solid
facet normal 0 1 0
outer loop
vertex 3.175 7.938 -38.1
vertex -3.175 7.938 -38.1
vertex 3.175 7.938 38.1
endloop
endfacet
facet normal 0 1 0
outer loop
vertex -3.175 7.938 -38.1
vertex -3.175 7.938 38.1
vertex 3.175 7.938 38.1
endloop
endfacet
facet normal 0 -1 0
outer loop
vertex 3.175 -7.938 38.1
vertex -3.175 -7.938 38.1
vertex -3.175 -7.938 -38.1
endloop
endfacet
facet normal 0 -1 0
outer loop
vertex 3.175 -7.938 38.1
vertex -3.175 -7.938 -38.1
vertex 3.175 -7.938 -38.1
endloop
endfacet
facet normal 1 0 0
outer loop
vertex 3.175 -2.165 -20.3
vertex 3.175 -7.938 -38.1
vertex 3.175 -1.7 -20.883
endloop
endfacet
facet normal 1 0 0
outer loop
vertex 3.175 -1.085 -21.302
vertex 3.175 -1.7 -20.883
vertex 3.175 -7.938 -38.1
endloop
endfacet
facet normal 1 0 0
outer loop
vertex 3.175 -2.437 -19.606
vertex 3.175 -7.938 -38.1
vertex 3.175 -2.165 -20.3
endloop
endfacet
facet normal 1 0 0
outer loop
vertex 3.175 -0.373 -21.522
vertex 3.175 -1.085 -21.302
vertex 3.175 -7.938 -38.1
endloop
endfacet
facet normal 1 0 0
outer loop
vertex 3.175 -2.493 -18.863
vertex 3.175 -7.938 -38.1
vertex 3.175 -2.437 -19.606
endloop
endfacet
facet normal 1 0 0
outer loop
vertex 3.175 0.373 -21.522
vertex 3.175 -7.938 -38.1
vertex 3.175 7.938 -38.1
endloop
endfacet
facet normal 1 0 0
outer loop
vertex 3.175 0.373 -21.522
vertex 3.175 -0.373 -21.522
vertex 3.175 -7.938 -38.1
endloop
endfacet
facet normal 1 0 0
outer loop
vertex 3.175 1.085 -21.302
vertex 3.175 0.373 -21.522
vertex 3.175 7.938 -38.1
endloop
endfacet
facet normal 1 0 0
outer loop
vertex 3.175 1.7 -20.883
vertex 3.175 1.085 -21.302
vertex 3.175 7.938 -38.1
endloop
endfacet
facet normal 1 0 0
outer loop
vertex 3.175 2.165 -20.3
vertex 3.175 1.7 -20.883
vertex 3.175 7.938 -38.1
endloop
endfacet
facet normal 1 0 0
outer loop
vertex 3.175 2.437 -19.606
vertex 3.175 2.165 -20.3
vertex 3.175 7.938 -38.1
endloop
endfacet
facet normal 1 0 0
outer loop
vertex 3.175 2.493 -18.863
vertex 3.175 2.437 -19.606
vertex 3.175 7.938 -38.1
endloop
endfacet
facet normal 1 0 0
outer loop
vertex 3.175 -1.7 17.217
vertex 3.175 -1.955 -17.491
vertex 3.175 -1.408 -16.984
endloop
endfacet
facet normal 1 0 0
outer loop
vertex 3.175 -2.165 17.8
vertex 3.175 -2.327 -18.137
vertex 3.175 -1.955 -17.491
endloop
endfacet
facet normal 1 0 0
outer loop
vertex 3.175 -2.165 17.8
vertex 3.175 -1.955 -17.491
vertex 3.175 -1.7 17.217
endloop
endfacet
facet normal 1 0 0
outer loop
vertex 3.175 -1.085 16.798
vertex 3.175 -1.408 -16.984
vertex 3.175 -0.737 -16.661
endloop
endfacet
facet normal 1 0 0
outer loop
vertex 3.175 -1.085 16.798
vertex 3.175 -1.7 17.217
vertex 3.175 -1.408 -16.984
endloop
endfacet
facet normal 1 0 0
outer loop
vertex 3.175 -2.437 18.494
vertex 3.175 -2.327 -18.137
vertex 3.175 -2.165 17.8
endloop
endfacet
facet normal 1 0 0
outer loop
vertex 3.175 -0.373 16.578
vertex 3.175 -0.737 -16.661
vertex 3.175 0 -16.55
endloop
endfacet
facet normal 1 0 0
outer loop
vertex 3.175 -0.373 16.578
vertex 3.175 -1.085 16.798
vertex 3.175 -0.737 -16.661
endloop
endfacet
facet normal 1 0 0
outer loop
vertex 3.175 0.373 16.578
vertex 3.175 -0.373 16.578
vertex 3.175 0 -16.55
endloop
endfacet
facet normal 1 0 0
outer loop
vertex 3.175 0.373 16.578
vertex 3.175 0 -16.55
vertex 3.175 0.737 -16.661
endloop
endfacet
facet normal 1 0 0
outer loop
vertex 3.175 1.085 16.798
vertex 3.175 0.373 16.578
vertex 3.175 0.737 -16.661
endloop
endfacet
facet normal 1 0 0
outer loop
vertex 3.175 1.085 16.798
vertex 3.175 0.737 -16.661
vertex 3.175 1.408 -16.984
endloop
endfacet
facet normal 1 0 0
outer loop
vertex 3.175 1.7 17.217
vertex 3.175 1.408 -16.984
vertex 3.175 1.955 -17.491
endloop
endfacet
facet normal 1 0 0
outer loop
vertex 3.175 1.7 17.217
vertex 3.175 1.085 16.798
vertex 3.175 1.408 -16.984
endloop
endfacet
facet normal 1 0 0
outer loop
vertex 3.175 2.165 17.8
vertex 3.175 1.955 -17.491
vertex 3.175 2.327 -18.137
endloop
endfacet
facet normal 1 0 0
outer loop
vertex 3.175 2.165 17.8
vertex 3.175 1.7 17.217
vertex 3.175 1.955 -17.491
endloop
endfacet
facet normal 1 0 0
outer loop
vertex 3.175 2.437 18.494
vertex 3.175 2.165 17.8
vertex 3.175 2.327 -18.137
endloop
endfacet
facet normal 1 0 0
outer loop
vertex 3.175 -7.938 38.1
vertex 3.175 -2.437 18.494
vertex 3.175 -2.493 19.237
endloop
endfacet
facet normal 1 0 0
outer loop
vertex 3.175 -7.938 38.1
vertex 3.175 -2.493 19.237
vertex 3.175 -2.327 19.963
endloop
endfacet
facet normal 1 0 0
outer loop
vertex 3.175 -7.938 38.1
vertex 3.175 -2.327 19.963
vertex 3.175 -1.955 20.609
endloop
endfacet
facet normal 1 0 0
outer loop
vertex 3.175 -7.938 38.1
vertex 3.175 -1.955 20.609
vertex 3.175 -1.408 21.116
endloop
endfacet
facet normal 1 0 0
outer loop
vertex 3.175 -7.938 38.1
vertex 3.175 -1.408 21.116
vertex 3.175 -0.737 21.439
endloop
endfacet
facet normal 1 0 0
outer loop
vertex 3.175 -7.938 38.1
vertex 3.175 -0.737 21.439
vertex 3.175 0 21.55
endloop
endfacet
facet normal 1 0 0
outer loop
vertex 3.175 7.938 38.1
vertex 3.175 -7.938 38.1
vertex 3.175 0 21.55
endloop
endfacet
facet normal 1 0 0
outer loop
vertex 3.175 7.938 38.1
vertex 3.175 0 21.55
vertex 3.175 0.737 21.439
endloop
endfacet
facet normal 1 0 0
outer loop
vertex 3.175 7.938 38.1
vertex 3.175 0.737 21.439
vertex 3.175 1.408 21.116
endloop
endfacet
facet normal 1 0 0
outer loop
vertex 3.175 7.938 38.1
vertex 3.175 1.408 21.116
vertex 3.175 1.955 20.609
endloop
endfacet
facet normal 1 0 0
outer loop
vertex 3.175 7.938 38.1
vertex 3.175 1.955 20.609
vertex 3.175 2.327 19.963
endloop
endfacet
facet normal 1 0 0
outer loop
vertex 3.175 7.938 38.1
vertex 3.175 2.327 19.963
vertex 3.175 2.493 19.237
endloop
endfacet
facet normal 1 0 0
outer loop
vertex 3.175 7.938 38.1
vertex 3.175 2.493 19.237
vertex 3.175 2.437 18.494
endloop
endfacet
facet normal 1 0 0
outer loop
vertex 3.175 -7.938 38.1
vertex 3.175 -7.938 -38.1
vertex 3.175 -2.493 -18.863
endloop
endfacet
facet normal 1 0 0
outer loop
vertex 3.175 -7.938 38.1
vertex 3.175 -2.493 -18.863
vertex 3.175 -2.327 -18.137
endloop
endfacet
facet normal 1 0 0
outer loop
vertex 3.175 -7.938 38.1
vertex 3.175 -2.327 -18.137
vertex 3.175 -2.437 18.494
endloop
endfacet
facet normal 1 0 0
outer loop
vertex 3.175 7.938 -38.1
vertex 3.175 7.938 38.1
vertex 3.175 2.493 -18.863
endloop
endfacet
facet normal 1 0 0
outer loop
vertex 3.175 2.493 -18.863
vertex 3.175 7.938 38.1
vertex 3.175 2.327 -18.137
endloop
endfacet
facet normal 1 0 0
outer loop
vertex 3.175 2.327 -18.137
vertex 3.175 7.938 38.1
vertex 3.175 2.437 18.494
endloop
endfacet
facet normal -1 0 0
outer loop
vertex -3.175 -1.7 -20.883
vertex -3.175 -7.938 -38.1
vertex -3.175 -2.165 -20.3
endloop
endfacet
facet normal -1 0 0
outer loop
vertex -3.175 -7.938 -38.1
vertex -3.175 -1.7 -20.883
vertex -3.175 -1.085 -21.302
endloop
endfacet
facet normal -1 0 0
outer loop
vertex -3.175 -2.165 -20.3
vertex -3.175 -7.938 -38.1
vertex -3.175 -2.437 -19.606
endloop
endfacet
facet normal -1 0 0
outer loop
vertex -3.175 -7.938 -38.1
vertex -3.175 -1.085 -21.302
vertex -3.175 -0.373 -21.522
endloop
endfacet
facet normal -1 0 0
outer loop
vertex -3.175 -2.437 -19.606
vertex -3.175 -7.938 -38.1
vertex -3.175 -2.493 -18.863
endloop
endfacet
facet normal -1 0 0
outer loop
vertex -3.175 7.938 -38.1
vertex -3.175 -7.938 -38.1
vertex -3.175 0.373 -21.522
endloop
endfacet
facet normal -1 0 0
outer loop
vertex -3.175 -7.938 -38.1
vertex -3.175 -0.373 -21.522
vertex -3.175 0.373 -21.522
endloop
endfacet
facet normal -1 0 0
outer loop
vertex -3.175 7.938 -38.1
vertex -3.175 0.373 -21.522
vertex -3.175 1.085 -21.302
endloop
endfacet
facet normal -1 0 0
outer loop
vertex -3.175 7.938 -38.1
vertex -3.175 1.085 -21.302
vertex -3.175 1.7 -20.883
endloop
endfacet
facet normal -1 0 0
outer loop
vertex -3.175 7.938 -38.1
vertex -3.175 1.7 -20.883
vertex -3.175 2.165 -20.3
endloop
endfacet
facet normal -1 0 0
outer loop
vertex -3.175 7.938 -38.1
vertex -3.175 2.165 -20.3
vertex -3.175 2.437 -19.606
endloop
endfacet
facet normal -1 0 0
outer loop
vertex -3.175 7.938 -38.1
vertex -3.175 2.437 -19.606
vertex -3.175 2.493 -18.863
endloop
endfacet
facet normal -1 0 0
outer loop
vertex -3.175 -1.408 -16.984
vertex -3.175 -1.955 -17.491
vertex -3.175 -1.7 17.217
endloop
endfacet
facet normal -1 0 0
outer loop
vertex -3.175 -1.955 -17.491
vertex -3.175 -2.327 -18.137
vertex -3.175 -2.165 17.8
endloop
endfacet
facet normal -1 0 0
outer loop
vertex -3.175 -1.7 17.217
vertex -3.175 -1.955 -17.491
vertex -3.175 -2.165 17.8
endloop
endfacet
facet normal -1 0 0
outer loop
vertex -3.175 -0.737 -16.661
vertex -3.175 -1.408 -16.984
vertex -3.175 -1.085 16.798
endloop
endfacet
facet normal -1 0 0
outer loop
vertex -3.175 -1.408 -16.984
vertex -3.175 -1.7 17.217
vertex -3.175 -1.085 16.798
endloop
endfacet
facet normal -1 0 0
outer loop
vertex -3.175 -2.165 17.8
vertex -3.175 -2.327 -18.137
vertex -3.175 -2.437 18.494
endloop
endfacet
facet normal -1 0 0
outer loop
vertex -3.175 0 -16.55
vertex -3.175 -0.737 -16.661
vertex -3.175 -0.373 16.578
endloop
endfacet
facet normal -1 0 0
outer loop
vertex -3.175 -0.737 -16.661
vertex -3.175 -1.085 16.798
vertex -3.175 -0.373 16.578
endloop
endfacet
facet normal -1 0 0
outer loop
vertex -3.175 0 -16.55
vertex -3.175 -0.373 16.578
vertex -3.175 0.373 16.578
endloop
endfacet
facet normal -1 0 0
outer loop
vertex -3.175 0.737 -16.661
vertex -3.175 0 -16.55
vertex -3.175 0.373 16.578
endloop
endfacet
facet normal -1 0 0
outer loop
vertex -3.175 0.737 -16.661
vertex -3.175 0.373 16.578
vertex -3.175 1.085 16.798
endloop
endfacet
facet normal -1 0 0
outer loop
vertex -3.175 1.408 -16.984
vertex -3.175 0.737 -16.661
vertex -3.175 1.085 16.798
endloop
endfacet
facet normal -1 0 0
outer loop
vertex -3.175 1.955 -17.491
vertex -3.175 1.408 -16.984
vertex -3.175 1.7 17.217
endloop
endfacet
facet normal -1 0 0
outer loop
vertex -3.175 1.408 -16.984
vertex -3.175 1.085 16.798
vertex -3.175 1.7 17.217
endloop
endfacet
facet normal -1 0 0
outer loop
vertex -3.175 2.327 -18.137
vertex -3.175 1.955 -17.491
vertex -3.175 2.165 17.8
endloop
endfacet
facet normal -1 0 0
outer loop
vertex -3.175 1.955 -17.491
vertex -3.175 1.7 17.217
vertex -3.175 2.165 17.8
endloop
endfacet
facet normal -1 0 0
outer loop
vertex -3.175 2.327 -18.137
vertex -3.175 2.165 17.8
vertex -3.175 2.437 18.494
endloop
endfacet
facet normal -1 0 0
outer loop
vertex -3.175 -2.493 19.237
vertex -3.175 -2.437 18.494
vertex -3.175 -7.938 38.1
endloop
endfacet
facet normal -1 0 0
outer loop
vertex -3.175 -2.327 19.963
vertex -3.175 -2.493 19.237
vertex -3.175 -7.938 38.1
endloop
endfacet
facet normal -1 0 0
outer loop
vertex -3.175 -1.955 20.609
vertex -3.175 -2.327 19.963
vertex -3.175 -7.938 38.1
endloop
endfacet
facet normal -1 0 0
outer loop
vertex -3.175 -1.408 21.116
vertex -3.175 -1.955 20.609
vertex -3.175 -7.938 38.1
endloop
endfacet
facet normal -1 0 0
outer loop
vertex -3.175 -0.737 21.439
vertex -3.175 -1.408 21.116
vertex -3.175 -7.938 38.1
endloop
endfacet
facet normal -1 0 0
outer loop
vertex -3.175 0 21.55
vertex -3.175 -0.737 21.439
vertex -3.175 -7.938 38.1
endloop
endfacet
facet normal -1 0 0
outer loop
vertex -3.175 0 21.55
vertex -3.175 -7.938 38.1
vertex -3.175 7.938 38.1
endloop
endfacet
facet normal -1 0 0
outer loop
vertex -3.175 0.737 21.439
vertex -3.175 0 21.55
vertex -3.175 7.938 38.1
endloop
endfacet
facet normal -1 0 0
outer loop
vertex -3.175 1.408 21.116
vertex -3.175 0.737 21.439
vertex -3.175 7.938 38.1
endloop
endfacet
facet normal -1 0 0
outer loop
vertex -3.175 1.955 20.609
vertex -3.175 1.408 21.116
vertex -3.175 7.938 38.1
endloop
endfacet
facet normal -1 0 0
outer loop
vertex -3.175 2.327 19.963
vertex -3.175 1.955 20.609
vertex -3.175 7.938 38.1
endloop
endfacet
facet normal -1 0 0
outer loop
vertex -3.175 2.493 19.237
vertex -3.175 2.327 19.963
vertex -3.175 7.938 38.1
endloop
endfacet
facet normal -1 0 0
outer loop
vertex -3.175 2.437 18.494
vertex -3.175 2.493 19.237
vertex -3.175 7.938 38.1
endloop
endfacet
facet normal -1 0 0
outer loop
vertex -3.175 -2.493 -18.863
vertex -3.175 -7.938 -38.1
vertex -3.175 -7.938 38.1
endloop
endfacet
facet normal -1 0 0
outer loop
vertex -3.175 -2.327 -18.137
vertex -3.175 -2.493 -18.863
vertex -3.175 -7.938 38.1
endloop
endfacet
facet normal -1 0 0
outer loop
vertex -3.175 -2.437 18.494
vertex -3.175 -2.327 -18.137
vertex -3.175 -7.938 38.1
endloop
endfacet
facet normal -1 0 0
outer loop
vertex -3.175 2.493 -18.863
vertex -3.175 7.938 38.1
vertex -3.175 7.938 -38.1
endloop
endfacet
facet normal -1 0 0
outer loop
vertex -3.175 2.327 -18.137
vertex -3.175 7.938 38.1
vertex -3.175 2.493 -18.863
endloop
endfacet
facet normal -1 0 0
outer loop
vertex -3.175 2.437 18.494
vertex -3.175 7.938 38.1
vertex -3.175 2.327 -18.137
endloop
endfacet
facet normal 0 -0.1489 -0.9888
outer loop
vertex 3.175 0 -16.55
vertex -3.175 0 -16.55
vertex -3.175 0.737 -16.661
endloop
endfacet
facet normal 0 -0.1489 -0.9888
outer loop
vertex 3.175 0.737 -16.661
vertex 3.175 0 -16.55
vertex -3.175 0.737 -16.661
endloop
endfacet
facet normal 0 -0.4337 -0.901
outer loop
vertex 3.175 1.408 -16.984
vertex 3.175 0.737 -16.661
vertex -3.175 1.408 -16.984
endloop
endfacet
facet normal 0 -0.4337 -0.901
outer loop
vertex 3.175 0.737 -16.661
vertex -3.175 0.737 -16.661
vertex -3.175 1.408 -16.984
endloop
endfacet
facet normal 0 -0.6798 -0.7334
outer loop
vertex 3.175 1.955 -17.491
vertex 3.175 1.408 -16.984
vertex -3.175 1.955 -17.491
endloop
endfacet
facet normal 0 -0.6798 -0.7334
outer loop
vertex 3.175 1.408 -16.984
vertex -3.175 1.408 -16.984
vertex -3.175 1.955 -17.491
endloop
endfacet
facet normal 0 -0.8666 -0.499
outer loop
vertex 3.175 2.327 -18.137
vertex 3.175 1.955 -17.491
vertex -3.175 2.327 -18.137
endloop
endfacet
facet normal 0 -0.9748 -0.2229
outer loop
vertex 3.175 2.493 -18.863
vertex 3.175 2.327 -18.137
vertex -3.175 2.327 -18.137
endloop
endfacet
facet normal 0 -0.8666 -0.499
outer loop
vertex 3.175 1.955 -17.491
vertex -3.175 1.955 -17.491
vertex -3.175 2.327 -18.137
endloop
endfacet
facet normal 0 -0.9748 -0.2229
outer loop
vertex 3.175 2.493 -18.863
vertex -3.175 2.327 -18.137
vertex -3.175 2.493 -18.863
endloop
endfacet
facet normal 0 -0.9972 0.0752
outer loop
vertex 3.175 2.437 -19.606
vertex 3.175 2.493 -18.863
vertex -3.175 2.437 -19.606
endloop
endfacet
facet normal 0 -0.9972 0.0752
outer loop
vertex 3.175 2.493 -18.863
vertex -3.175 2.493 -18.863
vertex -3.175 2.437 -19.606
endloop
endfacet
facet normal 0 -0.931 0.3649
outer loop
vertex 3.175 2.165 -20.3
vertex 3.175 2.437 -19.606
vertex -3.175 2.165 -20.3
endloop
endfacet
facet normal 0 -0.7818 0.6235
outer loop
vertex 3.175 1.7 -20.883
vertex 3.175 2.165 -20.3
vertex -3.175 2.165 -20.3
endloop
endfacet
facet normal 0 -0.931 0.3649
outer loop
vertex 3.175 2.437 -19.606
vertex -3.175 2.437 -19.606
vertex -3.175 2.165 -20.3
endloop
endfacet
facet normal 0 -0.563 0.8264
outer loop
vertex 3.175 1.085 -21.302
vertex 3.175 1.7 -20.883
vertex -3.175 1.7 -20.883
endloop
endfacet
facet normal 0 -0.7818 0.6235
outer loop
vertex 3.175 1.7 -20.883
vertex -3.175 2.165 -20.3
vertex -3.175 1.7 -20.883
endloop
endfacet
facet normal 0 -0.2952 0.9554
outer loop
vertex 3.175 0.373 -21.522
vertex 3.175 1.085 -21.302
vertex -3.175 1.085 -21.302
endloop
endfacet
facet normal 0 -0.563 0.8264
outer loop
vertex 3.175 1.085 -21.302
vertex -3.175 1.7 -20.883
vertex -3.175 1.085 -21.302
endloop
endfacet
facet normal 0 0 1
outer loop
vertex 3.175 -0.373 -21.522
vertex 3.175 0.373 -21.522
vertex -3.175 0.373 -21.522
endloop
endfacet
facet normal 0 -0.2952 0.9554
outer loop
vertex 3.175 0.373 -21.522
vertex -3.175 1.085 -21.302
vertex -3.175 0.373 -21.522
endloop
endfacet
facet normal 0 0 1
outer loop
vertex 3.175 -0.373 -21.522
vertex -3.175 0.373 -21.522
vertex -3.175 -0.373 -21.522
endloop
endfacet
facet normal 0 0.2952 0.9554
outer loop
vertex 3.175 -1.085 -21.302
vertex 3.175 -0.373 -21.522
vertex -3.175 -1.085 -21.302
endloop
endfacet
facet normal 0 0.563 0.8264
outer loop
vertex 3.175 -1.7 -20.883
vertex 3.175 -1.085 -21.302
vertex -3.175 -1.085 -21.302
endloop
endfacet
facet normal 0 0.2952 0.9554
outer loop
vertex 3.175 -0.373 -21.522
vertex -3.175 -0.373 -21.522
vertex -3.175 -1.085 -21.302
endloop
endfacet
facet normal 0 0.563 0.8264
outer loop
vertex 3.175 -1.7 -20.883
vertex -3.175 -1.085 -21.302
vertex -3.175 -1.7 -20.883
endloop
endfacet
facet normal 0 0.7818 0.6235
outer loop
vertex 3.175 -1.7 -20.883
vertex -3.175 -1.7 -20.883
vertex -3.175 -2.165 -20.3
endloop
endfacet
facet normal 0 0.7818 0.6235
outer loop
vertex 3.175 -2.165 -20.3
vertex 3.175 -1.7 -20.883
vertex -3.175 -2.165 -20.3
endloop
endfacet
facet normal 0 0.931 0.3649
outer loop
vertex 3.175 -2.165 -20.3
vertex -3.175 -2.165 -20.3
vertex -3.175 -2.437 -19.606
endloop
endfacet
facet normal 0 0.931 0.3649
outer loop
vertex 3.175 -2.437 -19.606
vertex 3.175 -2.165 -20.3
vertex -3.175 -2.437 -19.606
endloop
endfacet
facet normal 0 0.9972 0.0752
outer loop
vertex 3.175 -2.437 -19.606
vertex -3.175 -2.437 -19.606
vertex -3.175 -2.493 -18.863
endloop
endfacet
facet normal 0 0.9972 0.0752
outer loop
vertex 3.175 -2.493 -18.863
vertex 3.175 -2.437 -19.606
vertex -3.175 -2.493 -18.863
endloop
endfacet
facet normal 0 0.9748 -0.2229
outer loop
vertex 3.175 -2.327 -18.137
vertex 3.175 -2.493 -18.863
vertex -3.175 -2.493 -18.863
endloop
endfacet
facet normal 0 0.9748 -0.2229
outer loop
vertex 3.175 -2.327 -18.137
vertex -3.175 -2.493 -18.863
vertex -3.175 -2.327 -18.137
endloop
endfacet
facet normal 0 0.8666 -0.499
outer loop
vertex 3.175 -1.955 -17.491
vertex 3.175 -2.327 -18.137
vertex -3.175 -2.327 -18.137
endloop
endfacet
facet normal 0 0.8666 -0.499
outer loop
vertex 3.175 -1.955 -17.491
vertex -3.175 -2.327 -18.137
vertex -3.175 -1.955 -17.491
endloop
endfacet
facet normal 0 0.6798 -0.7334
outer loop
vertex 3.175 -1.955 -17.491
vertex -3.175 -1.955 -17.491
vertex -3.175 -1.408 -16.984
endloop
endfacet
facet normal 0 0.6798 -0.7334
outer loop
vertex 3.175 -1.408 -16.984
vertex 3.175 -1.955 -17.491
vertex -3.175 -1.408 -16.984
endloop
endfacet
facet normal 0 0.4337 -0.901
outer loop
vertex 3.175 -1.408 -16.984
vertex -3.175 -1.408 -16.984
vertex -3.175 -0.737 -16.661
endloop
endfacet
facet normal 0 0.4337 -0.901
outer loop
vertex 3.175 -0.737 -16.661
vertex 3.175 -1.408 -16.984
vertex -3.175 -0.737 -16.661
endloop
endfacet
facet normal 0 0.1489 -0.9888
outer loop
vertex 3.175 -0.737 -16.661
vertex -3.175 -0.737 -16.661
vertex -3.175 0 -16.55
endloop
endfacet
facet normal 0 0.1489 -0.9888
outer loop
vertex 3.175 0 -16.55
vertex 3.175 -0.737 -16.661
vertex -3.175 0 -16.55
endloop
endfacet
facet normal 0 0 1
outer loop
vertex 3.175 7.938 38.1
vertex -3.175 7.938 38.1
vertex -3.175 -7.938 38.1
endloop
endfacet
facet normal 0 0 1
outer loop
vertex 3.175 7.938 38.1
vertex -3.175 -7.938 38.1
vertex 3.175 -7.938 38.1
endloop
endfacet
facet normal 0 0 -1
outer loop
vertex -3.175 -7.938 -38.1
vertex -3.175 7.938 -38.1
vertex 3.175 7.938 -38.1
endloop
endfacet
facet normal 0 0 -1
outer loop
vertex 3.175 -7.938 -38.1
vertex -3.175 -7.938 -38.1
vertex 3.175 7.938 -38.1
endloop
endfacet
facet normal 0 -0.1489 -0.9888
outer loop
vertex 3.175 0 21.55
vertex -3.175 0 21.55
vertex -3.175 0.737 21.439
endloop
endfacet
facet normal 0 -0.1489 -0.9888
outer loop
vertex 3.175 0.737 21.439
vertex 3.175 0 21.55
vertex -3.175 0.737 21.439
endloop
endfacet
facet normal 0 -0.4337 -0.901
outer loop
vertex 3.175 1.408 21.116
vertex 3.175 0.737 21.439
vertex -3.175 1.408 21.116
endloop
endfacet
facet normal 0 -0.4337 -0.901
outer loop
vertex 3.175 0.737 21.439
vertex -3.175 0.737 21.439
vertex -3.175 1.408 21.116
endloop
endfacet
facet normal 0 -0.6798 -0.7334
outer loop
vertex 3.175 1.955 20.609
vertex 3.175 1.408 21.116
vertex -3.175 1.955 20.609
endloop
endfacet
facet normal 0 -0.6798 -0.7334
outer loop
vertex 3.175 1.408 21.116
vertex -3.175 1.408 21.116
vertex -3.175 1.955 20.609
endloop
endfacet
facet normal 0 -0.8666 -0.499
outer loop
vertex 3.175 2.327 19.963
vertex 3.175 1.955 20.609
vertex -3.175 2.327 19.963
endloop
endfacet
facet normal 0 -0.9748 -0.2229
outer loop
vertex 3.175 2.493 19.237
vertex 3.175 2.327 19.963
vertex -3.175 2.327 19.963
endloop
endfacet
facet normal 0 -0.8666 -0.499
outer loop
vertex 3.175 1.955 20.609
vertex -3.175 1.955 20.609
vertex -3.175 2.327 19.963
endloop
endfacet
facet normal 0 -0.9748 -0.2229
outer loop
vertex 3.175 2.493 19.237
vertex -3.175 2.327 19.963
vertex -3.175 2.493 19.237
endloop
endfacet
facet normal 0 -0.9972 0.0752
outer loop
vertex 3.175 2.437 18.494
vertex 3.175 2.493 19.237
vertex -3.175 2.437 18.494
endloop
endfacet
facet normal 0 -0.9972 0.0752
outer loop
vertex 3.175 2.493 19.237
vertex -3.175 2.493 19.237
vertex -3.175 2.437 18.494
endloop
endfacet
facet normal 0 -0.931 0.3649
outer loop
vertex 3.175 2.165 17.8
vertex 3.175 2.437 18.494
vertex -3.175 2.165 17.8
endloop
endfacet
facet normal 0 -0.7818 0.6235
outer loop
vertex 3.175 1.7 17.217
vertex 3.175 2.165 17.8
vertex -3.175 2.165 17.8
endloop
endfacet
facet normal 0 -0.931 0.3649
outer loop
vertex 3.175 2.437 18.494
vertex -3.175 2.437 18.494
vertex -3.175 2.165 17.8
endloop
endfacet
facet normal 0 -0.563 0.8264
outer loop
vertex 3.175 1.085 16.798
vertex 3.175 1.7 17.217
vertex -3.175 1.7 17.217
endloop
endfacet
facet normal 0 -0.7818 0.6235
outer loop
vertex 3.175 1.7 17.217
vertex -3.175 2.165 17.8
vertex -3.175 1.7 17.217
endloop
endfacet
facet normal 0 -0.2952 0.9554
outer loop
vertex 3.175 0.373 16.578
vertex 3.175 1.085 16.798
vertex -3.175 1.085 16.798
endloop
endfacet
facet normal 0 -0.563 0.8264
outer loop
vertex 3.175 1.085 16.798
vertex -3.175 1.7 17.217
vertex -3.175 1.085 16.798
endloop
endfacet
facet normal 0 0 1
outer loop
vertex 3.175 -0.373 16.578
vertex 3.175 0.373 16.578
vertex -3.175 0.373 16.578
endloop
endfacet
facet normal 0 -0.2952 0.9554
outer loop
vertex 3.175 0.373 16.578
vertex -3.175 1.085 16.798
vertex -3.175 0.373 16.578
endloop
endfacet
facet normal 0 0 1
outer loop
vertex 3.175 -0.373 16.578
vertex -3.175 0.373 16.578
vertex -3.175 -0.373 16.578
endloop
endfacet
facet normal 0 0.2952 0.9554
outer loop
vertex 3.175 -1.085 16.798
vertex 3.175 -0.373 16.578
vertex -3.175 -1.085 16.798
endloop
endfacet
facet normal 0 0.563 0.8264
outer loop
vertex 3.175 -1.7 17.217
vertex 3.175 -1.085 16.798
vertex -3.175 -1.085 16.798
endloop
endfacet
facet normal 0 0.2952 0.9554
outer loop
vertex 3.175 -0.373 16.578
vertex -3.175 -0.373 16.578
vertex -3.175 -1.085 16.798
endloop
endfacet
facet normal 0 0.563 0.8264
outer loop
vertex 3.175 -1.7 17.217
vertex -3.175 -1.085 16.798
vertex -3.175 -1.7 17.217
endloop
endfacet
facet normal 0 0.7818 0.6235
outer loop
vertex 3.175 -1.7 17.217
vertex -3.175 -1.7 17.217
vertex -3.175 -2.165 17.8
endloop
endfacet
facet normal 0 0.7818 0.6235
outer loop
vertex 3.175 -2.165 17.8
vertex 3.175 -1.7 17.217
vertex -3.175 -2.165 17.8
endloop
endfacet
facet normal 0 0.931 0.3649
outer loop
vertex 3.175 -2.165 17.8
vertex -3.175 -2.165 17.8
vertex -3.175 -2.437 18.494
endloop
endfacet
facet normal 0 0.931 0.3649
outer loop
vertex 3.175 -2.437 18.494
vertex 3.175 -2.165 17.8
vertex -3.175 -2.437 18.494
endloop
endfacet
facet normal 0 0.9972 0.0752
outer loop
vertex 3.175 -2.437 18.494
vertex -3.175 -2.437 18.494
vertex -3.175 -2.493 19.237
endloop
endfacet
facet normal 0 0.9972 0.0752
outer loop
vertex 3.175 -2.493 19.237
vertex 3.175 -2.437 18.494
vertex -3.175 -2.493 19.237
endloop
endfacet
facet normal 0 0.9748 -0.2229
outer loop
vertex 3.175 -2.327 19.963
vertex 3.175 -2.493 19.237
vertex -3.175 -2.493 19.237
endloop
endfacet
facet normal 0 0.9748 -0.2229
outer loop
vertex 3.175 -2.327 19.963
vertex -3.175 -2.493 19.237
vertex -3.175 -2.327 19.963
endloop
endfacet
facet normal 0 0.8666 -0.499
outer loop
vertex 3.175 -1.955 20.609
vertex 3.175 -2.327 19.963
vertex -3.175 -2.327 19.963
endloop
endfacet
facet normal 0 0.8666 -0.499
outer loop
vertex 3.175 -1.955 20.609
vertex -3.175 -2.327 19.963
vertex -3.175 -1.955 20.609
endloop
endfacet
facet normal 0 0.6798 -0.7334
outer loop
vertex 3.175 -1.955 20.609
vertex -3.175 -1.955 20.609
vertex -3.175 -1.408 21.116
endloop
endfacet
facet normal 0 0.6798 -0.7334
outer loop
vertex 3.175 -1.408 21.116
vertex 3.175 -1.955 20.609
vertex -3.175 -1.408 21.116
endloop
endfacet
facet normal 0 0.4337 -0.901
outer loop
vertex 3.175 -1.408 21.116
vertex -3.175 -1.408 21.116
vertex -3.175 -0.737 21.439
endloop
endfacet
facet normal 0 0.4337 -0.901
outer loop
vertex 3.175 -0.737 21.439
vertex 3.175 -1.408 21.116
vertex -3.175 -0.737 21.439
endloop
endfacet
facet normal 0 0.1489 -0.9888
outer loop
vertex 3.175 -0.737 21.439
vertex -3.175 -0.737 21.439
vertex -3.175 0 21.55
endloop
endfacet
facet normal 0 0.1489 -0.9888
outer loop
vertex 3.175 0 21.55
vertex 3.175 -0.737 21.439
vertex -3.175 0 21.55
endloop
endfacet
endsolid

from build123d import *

# Parameters (mm, degrees)
SKETCH1_W                 = 6.35
SKETCH1_H                 = 15.875
EXTRUDE1_DEPTH            = 38.1
M6X1_0_TAPPED_HOLE1_D     = 5
M6X1_0_TAPPED_HOLE1_DEPTH = 6.35


with BuildPart() as part:
    # Sketch1 → Extrude1 (new body, symmetric)
    with BuildSketch(Plane.XY):
        Rectangle(SKETCH1_W, SKETCH1_H)
    extrude(amount=EXTRUDE1_DEPTH, both=True)

    # M6x1.0 Tapped Hole1
    with Locations(Plane(origin=(3.175, 0, 0), x_dir=(0, 0, -1), z_dir=(1, 0, 0))):
        with Locations((-19.05, 0), (19.05, 0)):
            Hole(M6X1_0_TAPPED_HOLE1_D / 2, depth=M6X1_0_TAPPED_HOLE1_DEPTH)


solid = part.part
